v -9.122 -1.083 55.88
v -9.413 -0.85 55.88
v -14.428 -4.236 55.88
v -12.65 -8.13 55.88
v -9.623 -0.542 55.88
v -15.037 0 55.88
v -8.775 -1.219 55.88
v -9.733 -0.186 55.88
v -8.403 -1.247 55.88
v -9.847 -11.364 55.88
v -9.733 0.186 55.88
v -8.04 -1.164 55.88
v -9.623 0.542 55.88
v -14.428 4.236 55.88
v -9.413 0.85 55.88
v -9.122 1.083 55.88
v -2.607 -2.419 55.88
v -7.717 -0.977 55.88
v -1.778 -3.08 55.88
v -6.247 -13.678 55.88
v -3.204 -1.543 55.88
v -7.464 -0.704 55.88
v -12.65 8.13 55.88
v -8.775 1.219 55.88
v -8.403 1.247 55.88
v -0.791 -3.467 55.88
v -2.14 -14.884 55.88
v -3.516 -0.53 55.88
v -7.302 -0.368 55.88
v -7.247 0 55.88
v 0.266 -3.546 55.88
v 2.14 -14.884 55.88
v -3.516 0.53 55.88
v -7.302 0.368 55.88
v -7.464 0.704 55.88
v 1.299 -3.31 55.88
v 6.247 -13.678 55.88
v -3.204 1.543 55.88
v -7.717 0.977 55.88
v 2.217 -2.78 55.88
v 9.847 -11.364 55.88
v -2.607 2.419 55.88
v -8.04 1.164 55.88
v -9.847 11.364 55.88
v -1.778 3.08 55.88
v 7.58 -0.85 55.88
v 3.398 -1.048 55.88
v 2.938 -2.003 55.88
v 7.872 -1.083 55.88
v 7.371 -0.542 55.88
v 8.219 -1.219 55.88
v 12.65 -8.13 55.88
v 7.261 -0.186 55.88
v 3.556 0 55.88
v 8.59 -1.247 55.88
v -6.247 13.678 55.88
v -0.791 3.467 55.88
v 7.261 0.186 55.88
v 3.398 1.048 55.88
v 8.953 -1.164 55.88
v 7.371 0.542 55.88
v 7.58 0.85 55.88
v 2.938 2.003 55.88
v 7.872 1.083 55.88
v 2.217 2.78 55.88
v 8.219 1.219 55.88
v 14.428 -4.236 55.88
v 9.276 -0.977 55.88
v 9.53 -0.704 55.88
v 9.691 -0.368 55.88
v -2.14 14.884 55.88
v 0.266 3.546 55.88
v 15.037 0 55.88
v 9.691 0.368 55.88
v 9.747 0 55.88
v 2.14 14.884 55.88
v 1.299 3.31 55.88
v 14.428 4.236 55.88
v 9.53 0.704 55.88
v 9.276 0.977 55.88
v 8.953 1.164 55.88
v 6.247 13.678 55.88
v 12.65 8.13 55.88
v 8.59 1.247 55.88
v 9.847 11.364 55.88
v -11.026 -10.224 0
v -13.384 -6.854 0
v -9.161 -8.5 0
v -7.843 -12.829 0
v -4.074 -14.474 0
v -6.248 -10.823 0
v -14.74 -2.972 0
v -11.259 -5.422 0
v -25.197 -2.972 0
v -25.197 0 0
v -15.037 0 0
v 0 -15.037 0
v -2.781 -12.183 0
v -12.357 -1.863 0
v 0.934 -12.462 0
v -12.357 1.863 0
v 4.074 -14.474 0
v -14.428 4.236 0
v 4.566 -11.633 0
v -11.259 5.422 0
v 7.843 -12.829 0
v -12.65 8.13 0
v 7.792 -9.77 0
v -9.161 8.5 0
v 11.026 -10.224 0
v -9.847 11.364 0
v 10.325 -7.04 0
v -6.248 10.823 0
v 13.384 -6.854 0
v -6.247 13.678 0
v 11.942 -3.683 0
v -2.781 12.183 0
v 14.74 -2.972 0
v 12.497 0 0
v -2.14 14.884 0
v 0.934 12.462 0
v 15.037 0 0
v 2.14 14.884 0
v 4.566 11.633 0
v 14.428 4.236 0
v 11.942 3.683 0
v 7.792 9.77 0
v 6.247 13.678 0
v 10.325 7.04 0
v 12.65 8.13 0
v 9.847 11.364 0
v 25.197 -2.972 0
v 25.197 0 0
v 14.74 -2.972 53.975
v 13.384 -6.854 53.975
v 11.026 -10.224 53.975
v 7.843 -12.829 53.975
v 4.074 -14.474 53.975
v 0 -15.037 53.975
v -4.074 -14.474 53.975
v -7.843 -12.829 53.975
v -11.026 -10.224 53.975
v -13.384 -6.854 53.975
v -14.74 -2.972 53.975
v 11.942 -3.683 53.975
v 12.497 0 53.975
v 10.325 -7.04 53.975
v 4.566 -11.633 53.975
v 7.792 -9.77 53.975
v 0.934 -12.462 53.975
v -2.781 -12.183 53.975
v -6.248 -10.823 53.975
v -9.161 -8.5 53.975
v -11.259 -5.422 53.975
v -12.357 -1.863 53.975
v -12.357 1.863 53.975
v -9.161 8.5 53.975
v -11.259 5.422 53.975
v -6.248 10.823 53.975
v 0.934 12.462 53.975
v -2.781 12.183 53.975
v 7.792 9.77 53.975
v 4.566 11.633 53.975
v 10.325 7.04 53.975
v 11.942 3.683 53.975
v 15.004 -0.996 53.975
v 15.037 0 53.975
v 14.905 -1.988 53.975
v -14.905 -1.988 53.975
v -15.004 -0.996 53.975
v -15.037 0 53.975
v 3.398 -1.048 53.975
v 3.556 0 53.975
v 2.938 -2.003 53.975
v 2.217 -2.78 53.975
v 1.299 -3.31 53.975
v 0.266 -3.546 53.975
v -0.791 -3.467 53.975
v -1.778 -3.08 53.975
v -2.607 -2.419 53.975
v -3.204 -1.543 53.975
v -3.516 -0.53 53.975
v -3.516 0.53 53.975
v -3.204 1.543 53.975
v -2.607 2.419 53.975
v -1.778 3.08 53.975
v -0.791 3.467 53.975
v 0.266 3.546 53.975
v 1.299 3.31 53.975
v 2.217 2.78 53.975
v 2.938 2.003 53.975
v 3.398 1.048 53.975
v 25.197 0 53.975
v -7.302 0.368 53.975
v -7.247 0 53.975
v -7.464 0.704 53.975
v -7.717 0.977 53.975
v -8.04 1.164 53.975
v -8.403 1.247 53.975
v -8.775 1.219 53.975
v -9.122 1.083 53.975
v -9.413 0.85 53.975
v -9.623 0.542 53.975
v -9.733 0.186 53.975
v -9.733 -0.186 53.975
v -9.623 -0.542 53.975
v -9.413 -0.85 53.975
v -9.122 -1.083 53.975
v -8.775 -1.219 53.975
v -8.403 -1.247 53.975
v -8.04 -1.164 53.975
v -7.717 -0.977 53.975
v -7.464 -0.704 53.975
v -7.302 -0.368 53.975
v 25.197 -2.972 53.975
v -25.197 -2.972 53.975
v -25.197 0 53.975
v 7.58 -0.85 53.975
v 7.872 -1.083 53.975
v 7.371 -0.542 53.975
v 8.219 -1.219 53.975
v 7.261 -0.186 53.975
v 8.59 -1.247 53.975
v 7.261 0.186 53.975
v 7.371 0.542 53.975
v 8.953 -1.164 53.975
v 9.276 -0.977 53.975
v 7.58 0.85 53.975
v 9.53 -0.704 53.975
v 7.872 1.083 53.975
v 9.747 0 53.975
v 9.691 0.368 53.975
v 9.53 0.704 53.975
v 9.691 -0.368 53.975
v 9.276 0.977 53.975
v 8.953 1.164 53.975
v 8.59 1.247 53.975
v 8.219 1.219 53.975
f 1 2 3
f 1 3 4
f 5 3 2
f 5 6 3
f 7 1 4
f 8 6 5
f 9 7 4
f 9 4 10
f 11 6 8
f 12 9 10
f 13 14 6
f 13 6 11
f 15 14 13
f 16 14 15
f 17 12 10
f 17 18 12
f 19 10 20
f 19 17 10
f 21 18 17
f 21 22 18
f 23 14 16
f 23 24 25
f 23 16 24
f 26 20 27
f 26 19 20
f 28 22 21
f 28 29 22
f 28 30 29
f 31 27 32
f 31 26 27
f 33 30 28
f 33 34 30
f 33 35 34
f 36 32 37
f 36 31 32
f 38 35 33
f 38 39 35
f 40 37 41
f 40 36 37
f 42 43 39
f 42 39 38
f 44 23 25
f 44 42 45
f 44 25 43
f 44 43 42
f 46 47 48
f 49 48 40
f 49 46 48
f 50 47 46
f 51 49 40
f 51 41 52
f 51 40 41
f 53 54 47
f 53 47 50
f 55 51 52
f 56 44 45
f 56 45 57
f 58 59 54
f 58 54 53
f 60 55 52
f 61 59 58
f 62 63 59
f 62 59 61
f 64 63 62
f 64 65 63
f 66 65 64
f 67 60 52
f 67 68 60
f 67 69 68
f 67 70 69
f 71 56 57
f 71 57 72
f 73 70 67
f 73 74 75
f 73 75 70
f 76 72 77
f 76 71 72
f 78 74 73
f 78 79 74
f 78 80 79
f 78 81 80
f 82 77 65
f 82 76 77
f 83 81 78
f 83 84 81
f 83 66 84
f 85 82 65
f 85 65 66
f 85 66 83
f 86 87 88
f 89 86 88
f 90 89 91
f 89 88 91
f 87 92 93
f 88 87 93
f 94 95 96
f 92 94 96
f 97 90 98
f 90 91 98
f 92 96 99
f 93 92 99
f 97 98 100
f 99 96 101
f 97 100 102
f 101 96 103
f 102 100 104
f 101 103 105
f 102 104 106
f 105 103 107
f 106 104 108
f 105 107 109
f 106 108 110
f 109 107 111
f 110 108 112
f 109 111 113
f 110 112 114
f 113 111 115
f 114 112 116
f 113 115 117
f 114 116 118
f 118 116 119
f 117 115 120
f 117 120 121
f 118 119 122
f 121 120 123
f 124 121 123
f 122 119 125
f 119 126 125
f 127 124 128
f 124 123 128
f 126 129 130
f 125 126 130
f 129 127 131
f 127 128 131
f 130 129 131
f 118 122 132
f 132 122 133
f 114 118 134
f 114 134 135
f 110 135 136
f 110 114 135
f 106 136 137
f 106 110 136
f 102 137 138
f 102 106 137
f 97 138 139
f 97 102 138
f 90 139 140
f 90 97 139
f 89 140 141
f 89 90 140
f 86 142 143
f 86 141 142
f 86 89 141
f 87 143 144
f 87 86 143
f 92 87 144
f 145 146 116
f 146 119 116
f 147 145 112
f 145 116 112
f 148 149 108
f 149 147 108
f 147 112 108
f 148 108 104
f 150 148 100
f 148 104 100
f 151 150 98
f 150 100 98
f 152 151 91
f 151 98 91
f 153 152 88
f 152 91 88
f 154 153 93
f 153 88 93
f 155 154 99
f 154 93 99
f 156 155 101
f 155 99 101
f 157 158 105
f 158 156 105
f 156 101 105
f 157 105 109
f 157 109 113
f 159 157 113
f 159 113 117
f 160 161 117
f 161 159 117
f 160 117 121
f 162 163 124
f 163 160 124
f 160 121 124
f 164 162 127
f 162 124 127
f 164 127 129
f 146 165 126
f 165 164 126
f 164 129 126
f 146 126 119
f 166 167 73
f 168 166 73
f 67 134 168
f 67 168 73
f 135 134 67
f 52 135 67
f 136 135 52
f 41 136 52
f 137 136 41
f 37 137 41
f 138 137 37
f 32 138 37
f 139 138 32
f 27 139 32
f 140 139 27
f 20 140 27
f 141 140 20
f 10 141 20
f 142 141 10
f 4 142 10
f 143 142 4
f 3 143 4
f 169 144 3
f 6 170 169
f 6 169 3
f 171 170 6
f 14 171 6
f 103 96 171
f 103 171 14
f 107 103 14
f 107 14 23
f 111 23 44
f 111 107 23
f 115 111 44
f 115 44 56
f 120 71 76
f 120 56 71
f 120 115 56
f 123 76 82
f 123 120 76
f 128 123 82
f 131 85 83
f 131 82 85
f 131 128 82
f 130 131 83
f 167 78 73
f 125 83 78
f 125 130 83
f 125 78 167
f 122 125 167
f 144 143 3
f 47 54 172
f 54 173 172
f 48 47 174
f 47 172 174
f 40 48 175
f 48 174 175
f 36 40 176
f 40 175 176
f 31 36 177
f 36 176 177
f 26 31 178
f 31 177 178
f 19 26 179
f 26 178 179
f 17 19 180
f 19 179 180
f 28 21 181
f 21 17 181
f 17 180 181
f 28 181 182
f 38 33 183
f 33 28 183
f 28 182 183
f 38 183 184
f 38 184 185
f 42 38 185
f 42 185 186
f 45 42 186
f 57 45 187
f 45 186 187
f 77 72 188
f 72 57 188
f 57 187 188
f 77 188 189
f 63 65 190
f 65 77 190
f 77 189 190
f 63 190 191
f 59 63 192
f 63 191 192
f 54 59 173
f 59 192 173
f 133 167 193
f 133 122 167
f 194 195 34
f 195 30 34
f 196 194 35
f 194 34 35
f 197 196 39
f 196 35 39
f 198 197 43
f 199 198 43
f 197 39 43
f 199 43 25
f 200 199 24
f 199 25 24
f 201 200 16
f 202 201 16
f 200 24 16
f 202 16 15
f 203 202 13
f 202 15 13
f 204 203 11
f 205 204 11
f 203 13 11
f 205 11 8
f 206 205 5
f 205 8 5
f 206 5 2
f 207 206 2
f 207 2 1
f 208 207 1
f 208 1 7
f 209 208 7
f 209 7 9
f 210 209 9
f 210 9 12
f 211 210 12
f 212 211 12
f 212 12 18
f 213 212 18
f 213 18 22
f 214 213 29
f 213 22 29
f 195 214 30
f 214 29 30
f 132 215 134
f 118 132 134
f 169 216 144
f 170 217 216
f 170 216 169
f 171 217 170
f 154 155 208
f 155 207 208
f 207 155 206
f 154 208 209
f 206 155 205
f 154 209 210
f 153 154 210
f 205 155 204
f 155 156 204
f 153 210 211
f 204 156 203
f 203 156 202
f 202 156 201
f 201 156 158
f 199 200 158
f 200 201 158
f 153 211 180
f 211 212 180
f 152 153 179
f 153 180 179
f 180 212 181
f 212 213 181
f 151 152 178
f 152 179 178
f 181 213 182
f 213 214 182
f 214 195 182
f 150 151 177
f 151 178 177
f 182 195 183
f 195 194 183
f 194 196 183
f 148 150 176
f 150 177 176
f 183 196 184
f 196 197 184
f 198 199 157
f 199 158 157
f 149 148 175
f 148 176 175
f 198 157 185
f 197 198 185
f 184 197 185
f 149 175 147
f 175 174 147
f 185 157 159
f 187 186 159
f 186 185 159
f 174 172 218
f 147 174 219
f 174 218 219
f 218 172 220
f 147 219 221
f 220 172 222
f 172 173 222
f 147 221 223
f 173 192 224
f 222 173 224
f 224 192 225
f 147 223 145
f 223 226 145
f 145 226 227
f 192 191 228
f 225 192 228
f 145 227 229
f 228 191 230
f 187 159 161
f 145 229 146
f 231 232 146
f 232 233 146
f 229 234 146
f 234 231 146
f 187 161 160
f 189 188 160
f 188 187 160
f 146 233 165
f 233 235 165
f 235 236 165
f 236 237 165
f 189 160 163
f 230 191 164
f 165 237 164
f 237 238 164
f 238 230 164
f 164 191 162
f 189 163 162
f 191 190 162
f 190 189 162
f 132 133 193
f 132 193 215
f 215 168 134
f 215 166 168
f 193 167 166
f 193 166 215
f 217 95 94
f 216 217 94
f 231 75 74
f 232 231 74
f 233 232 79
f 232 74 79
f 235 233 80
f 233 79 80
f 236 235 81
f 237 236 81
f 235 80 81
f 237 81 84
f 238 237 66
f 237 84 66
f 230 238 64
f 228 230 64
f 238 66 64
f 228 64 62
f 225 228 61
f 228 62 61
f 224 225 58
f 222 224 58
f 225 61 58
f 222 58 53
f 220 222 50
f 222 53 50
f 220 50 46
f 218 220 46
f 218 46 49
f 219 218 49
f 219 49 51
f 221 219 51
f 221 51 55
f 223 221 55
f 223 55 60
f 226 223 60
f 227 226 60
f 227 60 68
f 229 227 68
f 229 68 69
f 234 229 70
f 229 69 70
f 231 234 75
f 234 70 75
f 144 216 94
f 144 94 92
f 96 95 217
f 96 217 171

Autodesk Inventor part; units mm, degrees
ref_plane "YZ Plane" through (0, 0, 0) normal (1, 0, 0) x (0, 1, 0)
ref_plane "XZ Plane" through (0, 0, 0) normal (0, 1, 0) x (-1, 0, 0)
ref_plane "XY Plane" through (0, 0, 0) normal (0, 0, 1) x (1, 0, 0)
sketch "Sketch1" plane through (0, 0, 0) normal (0, 0, 1) x (1, 0, 0)
  line L0 (-25.1968, 0) -> (-25.1968, -2.9718)
  line L1 (-25.1968, -2.9718) -> (-14.7402, -2.9718)
  line L2 (25.1968, 0) -> (25.1968, -2.9718)
  line L3 (25.1968, -2.9718) -> (14.7402, -2.9718)
  line L4 (-25.1968, 0) -> (-15.0368, 0)
  line L5 (15.0368, 0) -> (25.1968, 0)
  circle A0 centre (0, 0) radius 12.4968
  arc A1 (15.0368, 0) -> (-15.0368, 0) centre (0, 0) ccw
  arc A2 (-14.7402, -2.9718) -> (14.7402, -2.9718) centre (0, 0) ccw
  point P0 (-12.4968, 0)
  dimension "d12" = 24.9936
  dimension "d4" = 2.9718
  dimension "d5" = 2.9718
  dimension "d6" = 50.3936
  dimension "d9" = 12.7
  dimension "d13" = 15.0368
  dimension "d14" = 15.0368
  dimension "d15" = 10.4566
  dimension "d16" = 10.4566
  dimension "d17" = 10.16
extrude "Extrusion2" add sketch "Sketch1" along normal blind 53.975
sketch "Sketch2" plane through (0, 0, 53.975) normal (0, 0, 1) x (1, 0, 0)
  circle A0 centre (0, 0) radius 3.556
  circle A1 centre (0, 0) radius 15.0368
  dimension "d20" = 7.112
  dimension "d21" = 30.0736
extrude "Extrusion3" add sketch "Sketch2" along normal blind 1.905
sketch "Sketch3" plane through (0, 0, 55.88) normal (0, 0, 1) x (1, 0, 0)
  circle A0 centre (0, 0) radius 12.4968 projected
  circle A1 centre (-8.4968, 0) radius 1.25
  circle A2 centre (8.4968, 0) radius 1.25
  dimension "d25" = 2.5
  dimension "d26" = 8.4968
  dimension "d27" = 2.5
  dimension "d28" = 8.4968
extrude "Extrusion4" cut sketch "Sketch3" against normal blind 254 contours A1 | A2
properties part number "Attachment2"
